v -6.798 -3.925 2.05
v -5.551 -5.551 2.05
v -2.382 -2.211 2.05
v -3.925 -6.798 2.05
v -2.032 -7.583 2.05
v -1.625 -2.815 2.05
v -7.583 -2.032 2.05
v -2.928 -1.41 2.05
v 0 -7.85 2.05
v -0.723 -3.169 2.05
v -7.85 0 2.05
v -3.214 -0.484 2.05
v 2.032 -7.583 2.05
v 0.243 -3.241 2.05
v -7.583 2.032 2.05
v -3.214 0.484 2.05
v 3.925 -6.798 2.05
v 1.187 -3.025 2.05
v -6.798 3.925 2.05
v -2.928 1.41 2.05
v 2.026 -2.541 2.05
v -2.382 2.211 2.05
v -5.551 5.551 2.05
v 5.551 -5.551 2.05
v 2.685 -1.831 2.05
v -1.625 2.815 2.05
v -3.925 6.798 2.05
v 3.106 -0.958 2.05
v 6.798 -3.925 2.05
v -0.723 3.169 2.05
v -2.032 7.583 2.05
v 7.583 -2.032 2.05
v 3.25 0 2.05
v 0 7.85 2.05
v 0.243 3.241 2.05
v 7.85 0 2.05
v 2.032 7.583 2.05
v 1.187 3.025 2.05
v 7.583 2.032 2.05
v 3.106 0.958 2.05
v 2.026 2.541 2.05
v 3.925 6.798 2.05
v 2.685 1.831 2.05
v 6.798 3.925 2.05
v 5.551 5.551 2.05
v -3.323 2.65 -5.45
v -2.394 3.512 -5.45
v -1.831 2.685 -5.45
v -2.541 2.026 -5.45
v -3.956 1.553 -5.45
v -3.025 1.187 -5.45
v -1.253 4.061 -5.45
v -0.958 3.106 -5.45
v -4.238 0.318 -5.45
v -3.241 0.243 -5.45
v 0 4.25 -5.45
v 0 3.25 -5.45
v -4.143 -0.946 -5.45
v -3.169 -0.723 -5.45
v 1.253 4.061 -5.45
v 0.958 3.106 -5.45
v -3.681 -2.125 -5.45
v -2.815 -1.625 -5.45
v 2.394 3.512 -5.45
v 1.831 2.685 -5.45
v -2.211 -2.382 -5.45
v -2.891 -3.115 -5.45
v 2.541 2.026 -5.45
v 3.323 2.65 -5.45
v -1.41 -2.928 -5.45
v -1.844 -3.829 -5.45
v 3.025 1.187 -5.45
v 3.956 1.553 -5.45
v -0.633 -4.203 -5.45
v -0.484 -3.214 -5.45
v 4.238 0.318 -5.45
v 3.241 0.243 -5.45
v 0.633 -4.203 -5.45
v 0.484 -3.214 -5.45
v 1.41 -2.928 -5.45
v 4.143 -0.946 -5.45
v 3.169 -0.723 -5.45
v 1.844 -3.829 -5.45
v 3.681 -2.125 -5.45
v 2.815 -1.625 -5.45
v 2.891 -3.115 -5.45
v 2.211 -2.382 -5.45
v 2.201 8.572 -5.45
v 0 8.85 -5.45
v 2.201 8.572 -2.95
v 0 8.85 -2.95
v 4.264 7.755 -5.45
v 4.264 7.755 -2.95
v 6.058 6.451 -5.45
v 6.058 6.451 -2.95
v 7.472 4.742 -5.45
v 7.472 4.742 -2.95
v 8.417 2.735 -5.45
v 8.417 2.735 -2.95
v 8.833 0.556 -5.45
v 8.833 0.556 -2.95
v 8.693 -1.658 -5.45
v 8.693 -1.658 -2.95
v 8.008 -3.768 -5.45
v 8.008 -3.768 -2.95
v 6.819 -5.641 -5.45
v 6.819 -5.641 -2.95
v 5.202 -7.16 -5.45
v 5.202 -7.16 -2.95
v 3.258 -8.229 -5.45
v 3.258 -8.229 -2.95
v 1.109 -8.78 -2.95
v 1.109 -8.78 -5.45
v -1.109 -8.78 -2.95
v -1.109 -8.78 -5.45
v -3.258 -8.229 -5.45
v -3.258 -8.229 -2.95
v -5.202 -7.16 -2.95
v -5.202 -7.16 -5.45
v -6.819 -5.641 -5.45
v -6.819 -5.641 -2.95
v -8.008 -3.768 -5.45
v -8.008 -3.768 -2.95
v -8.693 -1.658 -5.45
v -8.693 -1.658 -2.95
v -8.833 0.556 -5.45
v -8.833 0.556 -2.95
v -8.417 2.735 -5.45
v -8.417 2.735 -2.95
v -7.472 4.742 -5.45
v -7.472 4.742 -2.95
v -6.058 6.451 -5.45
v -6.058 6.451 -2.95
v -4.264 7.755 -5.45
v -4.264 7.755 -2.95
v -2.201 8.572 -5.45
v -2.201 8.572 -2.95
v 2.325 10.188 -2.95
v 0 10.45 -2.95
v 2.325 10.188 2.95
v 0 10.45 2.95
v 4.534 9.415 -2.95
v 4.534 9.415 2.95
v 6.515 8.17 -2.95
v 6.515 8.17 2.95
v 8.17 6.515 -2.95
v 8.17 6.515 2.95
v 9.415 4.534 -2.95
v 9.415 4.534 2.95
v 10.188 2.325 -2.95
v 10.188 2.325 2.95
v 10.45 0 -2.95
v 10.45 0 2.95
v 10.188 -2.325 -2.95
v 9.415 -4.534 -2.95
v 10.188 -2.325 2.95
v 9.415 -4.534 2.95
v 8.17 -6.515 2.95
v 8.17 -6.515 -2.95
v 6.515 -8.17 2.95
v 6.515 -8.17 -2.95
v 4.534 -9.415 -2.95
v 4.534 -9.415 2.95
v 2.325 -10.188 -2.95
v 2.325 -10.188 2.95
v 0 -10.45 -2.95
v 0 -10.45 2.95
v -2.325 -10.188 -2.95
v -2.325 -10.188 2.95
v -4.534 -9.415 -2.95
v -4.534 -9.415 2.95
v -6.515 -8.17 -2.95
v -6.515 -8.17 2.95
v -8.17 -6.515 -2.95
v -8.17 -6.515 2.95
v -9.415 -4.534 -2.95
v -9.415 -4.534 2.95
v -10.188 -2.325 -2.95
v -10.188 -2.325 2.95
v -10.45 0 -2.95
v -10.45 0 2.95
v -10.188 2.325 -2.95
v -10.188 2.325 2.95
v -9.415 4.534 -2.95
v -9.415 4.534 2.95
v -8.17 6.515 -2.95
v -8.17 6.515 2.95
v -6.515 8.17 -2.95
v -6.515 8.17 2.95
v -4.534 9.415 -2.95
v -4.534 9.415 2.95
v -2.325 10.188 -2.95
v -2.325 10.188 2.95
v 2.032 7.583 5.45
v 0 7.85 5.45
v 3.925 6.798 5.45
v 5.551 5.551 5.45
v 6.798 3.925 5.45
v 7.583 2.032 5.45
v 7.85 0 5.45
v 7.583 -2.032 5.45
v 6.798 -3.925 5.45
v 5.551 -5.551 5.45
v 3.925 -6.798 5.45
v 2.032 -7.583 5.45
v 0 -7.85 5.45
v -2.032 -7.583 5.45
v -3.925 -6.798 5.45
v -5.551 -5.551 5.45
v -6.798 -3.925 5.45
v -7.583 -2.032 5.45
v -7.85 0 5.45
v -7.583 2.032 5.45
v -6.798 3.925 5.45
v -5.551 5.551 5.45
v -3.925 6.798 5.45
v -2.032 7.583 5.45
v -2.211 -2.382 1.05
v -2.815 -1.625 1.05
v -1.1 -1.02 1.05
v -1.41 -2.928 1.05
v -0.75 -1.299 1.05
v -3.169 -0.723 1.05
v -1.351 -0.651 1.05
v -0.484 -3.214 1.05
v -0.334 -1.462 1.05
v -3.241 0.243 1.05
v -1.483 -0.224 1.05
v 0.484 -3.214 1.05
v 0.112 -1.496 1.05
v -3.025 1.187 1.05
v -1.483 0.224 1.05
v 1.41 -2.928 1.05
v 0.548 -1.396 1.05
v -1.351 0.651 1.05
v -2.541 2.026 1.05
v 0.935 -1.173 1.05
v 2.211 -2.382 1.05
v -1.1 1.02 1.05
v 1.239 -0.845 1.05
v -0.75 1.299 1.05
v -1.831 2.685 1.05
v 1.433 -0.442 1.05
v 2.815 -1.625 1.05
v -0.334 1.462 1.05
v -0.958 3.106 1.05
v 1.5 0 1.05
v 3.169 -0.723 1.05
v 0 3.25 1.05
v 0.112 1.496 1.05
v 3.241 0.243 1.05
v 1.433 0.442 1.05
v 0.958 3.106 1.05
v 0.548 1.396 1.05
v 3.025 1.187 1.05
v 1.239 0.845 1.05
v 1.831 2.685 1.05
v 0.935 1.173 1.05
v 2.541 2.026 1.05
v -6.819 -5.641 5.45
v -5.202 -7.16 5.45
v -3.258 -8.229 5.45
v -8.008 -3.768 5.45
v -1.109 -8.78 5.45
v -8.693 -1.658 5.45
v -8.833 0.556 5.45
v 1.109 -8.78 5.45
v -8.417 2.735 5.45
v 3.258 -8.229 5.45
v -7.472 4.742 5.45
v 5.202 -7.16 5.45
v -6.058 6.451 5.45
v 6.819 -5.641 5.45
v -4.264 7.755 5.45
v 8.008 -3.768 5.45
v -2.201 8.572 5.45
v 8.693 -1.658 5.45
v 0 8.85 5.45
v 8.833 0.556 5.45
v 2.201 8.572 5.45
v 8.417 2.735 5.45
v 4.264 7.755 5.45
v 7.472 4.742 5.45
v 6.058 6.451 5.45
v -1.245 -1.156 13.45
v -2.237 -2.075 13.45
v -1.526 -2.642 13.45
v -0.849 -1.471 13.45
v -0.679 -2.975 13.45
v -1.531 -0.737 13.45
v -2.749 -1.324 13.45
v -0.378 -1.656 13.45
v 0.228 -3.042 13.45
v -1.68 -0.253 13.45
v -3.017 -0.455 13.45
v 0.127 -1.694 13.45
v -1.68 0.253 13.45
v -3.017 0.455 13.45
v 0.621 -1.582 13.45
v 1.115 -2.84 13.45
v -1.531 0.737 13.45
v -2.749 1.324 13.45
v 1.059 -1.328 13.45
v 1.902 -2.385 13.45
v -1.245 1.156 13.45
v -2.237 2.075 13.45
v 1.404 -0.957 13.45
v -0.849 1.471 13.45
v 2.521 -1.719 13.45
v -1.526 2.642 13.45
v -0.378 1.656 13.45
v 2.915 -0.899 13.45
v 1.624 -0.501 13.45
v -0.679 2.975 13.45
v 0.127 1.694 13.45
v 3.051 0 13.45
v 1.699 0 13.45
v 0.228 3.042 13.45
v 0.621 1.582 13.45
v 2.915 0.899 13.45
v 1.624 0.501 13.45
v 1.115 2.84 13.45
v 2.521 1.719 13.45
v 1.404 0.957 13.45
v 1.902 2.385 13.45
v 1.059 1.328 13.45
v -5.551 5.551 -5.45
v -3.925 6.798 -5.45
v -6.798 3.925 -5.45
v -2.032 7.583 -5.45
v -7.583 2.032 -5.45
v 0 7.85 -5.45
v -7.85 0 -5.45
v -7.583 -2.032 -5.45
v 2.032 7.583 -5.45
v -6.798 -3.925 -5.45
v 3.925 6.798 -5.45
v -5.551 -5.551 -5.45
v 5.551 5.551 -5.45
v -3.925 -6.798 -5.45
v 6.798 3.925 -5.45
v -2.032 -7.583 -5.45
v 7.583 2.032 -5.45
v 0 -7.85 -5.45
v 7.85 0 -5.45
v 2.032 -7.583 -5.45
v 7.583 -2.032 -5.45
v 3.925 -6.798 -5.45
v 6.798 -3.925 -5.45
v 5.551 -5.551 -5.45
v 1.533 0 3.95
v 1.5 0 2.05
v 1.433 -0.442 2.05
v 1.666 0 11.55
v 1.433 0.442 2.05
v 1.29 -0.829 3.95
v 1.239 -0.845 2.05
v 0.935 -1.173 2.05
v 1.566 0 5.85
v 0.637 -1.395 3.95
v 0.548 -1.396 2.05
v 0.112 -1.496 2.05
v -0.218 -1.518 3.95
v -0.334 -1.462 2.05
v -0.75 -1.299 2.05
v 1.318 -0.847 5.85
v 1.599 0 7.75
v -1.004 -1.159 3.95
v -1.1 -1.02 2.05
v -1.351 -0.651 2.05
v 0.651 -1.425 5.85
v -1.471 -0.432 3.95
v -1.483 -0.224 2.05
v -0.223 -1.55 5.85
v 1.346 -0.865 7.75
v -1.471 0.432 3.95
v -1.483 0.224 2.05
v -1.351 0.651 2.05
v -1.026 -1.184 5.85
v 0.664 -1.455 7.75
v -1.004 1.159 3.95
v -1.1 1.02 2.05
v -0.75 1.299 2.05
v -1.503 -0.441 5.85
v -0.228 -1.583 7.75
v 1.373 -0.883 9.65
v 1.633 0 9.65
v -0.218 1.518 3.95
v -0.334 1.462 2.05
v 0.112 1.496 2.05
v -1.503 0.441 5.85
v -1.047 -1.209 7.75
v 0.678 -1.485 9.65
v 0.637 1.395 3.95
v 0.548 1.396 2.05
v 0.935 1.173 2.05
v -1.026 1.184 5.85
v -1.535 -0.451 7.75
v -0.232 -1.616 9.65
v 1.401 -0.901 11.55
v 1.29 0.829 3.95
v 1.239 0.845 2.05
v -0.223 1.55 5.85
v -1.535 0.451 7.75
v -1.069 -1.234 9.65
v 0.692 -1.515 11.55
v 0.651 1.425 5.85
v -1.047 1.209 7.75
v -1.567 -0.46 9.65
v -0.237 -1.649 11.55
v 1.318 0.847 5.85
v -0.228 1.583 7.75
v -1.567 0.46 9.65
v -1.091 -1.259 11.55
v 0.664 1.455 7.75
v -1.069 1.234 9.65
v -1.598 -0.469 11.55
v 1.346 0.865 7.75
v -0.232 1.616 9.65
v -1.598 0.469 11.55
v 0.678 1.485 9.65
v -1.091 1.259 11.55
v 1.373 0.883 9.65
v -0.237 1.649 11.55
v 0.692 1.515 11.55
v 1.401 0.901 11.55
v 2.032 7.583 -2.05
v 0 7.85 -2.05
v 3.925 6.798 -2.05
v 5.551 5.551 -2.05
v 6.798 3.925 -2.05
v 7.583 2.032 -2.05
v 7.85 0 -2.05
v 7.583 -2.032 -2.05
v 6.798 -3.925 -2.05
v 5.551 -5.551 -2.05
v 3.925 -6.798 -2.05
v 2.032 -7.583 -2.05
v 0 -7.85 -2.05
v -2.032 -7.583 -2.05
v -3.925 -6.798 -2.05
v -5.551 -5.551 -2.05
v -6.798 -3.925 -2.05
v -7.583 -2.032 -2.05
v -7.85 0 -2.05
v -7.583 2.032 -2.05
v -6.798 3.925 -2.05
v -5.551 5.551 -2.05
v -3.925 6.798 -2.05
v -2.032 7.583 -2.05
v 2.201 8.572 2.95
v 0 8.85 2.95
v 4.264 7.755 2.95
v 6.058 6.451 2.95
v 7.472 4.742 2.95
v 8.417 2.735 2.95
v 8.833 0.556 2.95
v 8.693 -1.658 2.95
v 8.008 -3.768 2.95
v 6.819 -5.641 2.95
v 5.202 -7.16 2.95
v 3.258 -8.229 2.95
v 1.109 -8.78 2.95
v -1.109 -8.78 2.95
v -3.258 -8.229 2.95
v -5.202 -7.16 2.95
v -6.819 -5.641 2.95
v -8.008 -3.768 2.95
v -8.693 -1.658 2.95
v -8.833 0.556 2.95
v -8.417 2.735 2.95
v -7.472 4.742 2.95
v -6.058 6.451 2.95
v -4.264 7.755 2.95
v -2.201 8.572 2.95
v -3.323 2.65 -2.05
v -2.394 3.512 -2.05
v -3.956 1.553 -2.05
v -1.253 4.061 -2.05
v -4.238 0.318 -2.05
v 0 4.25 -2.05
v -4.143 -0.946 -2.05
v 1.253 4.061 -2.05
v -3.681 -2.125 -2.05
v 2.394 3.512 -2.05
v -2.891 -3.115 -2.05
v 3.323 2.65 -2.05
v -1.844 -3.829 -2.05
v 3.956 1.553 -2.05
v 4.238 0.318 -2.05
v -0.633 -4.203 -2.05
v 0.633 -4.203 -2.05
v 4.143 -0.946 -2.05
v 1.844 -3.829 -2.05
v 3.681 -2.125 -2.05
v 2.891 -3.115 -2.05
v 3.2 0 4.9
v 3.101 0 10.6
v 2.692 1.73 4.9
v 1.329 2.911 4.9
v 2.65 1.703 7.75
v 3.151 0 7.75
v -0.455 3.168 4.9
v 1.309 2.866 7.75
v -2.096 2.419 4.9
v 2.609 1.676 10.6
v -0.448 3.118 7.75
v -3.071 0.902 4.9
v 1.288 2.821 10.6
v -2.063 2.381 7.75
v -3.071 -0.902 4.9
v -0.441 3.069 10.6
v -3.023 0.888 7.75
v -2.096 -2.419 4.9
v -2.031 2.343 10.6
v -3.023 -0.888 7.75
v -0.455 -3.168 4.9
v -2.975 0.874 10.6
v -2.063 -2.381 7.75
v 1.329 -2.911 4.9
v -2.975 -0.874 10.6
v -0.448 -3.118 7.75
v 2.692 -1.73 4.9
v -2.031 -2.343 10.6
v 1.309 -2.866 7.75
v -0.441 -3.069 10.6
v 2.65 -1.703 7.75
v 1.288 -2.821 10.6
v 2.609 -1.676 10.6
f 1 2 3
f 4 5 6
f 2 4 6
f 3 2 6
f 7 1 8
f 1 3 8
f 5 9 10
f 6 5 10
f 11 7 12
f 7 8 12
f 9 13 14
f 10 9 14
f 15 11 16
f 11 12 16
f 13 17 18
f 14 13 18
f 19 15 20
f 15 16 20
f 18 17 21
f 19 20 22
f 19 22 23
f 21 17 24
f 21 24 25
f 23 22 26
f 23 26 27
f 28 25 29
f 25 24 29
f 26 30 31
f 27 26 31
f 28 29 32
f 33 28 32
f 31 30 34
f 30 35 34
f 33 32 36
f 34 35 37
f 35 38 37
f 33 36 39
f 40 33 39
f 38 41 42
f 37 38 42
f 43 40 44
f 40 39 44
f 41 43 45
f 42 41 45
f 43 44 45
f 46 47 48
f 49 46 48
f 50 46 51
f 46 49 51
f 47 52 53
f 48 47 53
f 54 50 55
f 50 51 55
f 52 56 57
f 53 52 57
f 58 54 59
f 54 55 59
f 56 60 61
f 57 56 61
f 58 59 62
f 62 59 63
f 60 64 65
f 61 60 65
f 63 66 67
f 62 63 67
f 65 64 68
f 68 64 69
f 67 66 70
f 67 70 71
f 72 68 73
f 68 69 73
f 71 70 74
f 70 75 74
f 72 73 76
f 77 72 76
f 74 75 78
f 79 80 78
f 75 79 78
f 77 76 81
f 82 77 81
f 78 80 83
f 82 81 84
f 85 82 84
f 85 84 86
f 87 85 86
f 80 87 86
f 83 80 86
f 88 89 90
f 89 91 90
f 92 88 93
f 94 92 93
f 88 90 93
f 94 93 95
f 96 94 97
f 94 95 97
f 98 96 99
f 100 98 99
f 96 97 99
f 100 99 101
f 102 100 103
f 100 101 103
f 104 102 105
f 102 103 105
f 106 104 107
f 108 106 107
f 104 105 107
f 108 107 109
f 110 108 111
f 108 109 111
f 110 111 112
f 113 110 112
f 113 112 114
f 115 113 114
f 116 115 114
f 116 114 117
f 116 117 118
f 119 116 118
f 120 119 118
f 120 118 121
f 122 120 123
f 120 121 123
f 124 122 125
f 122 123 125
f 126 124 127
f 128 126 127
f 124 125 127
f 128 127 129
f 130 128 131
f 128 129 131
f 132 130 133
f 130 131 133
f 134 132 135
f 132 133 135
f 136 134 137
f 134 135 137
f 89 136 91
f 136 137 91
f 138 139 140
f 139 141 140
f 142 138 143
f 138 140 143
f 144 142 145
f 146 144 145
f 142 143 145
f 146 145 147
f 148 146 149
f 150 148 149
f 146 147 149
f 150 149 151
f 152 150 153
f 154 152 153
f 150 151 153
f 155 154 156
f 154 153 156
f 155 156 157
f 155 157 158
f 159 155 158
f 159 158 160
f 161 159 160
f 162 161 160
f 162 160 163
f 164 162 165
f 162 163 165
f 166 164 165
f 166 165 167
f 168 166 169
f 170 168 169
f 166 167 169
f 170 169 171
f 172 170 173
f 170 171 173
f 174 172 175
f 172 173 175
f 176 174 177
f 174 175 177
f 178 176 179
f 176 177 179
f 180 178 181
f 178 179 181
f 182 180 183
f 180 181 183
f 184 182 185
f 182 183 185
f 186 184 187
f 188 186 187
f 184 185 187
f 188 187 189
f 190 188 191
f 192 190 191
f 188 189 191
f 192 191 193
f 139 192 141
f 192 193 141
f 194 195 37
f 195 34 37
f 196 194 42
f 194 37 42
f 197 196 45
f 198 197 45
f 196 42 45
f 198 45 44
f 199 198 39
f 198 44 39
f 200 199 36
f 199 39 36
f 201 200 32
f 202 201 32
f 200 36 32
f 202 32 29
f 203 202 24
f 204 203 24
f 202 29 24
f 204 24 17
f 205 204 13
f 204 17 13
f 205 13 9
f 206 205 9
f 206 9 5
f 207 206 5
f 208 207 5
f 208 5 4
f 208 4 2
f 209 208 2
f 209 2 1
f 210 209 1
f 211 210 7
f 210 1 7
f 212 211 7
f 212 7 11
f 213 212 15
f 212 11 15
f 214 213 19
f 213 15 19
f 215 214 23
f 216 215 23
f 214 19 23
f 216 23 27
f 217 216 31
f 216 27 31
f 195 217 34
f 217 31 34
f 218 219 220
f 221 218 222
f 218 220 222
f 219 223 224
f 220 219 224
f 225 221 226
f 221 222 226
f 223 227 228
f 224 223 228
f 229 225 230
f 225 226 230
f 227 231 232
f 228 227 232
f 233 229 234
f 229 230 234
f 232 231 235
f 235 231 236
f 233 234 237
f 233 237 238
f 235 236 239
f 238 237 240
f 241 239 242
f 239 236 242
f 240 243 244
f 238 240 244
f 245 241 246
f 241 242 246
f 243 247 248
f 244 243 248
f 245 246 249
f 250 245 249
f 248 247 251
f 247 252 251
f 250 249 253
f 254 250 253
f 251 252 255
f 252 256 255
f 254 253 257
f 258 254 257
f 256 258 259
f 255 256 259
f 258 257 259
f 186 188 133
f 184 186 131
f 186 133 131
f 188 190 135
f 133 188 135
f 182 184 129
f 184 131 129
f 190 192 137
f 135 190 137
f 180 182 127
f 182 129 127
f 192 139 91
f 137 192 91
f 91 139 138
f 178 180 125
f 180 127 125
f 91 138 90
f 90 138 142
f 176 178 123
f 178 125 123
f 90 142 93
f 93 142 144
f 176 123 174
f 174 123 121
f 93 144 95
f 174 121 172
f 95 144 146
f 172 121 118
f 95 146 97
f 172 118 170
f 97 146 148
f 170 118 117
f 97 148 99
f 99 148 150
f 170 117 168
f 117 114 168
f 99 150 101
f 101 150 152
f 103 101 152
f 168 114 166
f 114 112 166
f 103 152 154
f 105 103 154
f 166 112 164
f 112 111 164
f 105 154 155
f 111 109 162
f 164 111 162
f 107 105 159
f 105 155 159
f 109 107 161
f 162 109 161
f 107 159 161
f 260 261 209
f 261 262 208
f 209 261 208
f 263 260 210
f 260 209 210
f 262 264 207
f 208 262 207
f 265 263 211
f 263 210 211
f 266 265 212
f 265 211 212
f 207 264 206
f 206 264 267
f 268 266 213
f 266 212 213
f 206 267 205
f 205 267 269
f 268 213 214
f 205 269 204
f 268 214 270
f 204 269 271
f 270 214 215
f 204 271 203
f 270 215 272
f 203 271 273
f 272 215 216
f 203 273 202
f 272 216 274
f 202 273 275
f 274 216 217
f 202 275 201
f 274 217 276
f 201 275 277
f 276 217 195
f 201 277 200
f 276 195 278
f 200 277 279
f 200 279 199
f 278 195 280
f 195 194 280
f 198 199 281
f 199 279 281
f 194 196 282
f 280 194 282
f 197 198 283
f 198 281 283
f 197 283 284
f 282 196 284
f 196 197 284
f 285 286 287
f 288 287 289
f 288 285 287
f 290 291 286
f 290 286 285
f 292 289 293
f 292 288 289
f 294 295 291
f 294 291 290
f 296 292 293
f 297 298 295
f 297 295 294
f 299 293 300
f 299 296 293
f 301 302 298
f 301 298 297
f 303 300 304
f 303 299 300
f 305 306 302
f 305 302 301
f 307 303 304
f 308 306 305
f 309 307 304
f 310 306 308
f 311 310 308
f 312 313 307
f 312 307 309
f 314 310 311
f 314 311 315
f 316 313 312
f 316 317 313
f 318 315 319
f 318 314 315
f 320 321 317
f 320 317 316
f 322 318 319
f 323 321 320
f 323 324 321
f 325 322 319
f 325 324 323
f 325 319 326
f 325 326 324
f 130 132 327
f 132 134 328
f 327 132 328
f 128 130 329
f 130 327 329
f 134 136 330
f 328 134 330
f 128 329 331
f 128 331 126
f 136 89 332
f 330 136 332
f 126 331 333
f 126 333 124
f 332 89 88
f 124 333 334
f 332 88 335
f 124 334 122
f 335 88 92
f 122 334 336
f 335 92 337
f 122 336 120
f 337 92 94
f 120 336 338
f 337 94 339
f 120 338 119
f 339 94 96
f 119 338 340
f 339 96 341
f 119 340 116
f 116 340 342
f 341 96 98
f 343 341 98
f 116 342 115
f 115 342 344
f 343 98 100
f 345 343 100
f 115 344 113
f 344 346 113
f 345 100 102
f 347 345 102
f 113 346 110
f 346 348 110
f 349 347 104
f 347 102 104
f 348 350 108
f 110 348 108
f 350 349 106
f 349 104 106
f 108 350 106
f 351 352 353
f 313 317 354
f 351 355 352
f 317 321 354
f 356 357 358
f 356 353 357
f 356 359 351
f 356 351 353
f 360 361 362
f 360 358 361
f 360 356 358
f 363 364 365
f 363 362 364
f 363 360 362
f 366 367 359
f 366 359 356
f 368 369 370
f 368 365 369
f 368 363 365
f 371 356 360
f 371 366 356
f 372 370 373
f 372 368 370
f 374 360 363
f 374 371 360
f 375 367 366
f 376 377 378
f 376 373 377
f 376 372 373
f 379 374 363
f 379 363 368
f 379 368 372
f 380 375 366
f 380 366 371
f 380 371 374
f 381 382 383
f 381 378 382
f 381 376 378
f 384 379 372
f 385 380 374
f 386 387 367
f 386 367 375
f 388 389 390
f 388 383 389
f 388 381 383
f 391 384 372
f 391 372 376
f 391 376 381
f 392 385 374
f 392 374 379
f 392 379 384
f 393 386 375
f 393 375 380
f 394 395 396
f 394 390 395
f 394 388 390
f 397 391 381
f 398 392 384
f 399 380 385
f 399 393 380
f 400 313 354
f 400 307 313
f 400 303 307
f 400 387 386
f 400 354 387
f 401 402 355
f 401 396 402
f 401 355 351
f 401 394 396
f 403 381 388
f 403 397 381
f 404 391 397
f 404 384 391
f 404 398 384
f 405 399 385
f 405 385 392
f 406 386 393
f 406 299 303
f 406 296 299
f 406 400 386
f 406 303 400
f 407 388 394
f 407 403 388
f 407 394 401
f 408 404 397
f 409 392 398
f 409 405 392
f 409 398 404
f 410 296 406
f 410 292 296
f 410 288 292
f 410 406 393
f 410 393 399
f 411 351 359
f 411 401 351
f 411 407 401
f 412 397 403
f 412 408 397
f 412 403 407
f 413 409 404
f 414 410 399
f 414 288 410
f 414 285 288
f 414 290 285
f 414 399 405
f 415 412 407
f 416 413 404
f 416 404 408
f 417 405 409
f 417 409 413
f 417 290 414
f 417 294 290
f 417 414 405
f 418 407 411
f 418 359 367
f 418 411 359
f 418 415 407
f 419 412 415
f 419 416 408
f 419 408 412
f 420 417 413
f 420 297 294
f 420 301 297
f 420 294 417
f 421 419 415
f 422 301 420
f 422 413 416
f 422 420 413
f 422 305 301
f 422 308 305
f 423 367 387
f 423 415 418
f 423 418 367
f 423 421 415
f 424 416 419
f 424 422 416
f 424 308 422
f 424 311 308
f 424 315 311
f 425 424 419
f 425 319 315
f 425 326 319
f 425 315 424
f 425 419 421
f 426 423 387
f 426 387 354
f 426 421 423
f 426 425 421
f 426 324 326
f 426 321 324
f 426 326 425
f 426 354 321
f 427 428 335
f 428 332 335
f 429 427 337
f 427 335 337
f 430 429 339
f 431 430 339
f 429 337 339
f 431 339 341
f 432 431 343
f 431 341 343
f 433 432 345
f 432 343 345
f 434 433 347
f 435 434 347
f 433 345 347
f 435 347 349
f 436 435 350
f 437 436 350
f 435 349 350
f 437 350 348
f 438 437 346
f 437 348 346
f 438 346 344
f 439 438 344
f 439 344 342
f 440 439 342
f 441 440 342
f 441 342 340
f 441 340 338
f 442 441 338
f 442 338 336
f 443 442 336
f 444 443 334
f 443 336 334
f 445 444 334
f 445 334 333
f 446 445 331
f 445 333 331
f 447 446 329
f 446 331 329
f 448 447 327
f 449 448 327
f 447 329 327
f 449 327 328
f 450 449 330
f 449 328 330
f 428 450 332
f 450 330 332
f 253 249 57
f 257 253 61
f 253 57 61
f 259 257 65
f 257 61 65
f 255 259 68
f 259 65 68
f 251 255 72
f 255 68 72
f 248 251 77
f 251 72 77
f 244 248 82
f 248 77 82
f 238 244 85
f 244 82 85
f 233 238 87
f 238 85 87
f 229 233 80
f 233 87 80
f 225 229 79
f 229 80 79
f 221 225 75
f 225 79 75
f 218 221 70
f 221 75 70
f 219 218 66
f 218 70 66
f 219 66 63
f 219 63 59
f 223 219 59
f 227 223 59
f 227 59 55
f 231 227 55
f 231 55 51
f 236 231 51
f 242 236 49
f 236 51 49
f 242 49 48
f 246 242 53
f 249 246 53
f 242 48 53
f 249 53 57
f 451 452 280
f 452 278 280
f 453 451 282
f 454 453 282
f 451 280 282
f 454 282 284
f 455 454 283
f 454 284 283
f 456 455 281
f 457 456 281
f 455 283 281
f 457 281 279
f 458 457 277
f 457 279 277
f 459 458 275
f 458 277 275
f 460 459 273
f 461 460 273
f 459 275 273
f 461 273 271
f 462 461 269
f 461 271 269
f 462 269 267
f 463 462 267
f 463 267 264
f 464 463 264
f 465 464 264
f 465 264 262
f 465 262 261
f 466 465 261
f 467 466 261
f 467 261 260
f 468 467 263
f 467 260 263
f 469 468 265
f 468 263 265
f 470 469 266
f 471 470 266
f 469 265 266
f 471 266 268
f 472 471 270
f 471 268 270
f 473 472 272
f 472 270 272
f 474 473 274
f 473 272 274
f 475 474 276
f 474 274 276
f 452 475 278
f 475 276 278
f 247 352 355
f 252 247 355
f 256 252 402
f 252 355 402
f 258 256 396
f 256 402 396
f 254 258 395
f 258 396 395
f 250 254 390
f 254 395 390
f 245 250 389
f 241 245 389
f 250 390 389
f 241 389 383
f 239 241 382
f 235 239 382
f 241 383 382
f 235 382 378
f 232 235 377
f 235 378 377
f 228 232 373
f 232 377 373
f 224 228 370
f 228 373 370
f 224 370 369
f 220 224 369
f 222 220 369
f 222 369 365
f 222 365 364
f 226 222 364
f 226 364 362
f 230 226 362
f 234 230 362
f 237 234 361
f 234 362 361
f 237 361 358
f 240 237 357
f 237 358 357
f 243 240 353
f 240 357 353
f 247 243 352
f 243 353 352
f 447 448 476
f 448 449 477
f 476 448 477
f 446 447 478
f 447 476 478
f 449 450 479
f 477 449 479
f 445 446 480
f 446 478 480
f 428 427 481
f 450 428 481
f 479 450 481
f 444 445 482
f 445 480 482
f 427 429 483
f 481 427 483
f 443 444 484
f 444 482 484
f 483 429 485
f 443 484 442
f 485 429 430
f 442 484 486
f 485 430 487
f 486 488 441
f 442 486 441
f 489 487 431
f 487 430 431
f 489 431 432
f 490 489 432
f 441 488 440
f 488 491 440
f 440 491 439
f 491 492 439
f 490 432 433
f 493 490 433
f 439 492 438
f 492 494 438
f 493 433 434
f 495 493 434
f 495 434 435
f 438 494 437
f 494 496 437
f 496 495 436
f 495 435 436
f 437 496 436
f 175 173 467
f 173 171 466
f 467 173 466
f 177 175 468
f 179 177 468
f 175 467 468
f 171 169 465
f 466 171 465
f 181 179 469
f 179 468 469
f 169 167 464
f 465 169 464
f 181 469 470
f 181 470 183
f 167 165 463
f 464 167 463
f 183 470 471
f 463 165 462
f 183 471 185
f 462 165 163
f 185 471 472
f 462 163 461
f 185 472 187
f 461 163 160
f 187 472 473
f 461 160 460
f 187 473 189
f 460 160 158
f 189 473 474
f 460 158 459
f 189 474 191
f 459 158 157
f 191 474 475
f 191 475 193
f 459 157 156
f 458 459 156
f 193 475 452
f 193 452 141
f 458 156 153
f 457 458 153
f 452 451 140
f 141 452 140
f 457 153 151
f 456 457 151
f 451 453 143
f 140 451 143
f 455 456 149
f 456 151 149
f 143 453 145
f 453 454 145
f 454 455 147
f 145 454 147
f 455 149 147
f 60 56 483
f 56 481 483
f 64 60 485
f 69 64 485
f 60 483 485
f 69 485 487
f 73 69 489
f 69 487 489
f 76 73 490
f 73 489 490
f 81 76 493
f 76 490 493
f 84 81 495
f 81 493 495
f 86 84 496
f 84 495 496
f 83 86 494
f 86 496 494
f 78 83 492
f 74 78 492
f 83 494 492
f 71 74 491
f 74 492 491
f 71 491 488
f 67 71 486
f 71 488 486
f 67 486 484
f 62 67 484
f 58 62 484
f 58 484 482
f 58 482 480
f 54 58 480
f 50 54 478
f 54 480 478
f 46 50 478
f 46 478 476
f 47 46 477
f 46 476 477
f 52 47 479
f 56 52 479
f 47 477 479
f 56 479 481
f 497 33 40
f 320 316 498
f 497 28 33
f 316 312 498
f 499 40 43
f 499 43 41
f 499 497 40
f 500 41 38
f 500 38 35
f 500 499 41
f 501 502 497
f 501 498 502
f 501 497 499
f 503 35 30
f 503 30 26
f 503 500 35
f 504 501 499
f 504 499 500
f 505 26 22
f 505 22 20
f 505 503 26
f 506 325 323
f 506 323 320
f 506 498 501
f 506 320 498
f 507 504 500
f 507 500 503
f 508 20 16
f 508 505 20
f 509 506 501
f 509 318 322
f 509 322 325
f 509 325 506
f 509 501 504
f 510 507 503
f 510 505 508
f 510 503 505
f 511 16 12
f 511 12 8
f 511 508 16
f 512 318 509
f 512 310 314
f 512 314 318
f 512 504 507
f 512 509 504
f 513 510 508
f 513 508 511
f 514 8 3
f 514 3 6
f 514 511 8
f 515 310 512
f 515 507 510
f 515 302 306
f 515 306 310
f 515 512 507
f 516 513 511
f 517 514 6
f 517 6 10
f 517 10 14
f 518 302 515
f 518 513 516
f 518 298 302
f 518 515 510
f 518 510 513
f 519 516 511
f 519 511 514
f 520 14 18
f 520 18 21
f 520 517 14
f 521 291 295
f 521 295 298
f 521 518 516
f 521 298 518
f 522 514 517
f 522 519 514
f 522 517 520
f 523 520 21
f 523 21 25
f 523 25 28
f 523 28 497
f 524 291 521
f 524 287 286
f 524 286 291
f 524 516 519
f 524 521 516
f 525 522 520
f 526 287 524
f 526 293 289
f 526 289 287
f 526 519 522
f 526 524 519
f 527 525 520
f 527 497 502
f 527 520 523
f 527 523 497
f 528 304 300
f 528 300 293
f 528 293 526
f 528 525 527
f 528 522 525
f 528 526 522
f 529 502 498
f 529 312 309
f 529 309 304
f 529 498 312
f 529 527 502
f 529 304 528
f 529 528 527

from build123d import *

# Parameters (mm, degrees)
SKETCH3_R                     = 3.25
SKETCH3_R_2                   = 1.5
BOSS_EXTRUDE2_DEPTH           = 11.4
BOSS_EXTRUDE2_TAPER           = 1
BOSS_EXTRUDE2_OTHER_WAY_DEPTH = 1


with BuildPart() as part:
    # Sketch2 → Revolve2 (revolve)
    with BuildSketch(Plane(origin=(0, 0, 0), x_dir=(0, 0, -1), z_dir=(1, 0, 0))):
        Polygon((-2.05, 3.25), (5.45, 3.25), (5.45, 4.25), (2.05, 4.25), (2.05, 7.85), (5.45, 7.85), (5.45, 8.85), (2.95, 8.85), (2.95, 10.45), (-2.95, 10.45), (-2.95, 8.85), (-5.45, 8.85), (-5.45, 7.85), (-2.05, 7.85), align=None)
    revolve(axis=Axis((0, 0, 8.833851455), (0, 0, -1)))

    # Sketch3 → Boss-Extrude2 (add)
    with BuildSketch(Plane.XY.offset(2.05)):
        Circle(SKETCH3_R)
        Circle(SKETCH3_R_2, mode=Mode.SUBTRACT)
    extrude(amount=BOSS_EXTRUDE2_DEPTH, taper=BOSS_EXTRUDE2_TAPER)

    # Sketch3 → Boss-Extrude2 other way (add)
    with BuildSketch(Plane.XY.offset(2.05)):
        Circle(SKETCH3_R)
        Circle(SKETCH3_R_2, mode=Mode.SUBTRACT)
    extrude(amount=-BOSS_EXTRUDE2_OTHER_WAY_DEPTH)


solid = part.part
